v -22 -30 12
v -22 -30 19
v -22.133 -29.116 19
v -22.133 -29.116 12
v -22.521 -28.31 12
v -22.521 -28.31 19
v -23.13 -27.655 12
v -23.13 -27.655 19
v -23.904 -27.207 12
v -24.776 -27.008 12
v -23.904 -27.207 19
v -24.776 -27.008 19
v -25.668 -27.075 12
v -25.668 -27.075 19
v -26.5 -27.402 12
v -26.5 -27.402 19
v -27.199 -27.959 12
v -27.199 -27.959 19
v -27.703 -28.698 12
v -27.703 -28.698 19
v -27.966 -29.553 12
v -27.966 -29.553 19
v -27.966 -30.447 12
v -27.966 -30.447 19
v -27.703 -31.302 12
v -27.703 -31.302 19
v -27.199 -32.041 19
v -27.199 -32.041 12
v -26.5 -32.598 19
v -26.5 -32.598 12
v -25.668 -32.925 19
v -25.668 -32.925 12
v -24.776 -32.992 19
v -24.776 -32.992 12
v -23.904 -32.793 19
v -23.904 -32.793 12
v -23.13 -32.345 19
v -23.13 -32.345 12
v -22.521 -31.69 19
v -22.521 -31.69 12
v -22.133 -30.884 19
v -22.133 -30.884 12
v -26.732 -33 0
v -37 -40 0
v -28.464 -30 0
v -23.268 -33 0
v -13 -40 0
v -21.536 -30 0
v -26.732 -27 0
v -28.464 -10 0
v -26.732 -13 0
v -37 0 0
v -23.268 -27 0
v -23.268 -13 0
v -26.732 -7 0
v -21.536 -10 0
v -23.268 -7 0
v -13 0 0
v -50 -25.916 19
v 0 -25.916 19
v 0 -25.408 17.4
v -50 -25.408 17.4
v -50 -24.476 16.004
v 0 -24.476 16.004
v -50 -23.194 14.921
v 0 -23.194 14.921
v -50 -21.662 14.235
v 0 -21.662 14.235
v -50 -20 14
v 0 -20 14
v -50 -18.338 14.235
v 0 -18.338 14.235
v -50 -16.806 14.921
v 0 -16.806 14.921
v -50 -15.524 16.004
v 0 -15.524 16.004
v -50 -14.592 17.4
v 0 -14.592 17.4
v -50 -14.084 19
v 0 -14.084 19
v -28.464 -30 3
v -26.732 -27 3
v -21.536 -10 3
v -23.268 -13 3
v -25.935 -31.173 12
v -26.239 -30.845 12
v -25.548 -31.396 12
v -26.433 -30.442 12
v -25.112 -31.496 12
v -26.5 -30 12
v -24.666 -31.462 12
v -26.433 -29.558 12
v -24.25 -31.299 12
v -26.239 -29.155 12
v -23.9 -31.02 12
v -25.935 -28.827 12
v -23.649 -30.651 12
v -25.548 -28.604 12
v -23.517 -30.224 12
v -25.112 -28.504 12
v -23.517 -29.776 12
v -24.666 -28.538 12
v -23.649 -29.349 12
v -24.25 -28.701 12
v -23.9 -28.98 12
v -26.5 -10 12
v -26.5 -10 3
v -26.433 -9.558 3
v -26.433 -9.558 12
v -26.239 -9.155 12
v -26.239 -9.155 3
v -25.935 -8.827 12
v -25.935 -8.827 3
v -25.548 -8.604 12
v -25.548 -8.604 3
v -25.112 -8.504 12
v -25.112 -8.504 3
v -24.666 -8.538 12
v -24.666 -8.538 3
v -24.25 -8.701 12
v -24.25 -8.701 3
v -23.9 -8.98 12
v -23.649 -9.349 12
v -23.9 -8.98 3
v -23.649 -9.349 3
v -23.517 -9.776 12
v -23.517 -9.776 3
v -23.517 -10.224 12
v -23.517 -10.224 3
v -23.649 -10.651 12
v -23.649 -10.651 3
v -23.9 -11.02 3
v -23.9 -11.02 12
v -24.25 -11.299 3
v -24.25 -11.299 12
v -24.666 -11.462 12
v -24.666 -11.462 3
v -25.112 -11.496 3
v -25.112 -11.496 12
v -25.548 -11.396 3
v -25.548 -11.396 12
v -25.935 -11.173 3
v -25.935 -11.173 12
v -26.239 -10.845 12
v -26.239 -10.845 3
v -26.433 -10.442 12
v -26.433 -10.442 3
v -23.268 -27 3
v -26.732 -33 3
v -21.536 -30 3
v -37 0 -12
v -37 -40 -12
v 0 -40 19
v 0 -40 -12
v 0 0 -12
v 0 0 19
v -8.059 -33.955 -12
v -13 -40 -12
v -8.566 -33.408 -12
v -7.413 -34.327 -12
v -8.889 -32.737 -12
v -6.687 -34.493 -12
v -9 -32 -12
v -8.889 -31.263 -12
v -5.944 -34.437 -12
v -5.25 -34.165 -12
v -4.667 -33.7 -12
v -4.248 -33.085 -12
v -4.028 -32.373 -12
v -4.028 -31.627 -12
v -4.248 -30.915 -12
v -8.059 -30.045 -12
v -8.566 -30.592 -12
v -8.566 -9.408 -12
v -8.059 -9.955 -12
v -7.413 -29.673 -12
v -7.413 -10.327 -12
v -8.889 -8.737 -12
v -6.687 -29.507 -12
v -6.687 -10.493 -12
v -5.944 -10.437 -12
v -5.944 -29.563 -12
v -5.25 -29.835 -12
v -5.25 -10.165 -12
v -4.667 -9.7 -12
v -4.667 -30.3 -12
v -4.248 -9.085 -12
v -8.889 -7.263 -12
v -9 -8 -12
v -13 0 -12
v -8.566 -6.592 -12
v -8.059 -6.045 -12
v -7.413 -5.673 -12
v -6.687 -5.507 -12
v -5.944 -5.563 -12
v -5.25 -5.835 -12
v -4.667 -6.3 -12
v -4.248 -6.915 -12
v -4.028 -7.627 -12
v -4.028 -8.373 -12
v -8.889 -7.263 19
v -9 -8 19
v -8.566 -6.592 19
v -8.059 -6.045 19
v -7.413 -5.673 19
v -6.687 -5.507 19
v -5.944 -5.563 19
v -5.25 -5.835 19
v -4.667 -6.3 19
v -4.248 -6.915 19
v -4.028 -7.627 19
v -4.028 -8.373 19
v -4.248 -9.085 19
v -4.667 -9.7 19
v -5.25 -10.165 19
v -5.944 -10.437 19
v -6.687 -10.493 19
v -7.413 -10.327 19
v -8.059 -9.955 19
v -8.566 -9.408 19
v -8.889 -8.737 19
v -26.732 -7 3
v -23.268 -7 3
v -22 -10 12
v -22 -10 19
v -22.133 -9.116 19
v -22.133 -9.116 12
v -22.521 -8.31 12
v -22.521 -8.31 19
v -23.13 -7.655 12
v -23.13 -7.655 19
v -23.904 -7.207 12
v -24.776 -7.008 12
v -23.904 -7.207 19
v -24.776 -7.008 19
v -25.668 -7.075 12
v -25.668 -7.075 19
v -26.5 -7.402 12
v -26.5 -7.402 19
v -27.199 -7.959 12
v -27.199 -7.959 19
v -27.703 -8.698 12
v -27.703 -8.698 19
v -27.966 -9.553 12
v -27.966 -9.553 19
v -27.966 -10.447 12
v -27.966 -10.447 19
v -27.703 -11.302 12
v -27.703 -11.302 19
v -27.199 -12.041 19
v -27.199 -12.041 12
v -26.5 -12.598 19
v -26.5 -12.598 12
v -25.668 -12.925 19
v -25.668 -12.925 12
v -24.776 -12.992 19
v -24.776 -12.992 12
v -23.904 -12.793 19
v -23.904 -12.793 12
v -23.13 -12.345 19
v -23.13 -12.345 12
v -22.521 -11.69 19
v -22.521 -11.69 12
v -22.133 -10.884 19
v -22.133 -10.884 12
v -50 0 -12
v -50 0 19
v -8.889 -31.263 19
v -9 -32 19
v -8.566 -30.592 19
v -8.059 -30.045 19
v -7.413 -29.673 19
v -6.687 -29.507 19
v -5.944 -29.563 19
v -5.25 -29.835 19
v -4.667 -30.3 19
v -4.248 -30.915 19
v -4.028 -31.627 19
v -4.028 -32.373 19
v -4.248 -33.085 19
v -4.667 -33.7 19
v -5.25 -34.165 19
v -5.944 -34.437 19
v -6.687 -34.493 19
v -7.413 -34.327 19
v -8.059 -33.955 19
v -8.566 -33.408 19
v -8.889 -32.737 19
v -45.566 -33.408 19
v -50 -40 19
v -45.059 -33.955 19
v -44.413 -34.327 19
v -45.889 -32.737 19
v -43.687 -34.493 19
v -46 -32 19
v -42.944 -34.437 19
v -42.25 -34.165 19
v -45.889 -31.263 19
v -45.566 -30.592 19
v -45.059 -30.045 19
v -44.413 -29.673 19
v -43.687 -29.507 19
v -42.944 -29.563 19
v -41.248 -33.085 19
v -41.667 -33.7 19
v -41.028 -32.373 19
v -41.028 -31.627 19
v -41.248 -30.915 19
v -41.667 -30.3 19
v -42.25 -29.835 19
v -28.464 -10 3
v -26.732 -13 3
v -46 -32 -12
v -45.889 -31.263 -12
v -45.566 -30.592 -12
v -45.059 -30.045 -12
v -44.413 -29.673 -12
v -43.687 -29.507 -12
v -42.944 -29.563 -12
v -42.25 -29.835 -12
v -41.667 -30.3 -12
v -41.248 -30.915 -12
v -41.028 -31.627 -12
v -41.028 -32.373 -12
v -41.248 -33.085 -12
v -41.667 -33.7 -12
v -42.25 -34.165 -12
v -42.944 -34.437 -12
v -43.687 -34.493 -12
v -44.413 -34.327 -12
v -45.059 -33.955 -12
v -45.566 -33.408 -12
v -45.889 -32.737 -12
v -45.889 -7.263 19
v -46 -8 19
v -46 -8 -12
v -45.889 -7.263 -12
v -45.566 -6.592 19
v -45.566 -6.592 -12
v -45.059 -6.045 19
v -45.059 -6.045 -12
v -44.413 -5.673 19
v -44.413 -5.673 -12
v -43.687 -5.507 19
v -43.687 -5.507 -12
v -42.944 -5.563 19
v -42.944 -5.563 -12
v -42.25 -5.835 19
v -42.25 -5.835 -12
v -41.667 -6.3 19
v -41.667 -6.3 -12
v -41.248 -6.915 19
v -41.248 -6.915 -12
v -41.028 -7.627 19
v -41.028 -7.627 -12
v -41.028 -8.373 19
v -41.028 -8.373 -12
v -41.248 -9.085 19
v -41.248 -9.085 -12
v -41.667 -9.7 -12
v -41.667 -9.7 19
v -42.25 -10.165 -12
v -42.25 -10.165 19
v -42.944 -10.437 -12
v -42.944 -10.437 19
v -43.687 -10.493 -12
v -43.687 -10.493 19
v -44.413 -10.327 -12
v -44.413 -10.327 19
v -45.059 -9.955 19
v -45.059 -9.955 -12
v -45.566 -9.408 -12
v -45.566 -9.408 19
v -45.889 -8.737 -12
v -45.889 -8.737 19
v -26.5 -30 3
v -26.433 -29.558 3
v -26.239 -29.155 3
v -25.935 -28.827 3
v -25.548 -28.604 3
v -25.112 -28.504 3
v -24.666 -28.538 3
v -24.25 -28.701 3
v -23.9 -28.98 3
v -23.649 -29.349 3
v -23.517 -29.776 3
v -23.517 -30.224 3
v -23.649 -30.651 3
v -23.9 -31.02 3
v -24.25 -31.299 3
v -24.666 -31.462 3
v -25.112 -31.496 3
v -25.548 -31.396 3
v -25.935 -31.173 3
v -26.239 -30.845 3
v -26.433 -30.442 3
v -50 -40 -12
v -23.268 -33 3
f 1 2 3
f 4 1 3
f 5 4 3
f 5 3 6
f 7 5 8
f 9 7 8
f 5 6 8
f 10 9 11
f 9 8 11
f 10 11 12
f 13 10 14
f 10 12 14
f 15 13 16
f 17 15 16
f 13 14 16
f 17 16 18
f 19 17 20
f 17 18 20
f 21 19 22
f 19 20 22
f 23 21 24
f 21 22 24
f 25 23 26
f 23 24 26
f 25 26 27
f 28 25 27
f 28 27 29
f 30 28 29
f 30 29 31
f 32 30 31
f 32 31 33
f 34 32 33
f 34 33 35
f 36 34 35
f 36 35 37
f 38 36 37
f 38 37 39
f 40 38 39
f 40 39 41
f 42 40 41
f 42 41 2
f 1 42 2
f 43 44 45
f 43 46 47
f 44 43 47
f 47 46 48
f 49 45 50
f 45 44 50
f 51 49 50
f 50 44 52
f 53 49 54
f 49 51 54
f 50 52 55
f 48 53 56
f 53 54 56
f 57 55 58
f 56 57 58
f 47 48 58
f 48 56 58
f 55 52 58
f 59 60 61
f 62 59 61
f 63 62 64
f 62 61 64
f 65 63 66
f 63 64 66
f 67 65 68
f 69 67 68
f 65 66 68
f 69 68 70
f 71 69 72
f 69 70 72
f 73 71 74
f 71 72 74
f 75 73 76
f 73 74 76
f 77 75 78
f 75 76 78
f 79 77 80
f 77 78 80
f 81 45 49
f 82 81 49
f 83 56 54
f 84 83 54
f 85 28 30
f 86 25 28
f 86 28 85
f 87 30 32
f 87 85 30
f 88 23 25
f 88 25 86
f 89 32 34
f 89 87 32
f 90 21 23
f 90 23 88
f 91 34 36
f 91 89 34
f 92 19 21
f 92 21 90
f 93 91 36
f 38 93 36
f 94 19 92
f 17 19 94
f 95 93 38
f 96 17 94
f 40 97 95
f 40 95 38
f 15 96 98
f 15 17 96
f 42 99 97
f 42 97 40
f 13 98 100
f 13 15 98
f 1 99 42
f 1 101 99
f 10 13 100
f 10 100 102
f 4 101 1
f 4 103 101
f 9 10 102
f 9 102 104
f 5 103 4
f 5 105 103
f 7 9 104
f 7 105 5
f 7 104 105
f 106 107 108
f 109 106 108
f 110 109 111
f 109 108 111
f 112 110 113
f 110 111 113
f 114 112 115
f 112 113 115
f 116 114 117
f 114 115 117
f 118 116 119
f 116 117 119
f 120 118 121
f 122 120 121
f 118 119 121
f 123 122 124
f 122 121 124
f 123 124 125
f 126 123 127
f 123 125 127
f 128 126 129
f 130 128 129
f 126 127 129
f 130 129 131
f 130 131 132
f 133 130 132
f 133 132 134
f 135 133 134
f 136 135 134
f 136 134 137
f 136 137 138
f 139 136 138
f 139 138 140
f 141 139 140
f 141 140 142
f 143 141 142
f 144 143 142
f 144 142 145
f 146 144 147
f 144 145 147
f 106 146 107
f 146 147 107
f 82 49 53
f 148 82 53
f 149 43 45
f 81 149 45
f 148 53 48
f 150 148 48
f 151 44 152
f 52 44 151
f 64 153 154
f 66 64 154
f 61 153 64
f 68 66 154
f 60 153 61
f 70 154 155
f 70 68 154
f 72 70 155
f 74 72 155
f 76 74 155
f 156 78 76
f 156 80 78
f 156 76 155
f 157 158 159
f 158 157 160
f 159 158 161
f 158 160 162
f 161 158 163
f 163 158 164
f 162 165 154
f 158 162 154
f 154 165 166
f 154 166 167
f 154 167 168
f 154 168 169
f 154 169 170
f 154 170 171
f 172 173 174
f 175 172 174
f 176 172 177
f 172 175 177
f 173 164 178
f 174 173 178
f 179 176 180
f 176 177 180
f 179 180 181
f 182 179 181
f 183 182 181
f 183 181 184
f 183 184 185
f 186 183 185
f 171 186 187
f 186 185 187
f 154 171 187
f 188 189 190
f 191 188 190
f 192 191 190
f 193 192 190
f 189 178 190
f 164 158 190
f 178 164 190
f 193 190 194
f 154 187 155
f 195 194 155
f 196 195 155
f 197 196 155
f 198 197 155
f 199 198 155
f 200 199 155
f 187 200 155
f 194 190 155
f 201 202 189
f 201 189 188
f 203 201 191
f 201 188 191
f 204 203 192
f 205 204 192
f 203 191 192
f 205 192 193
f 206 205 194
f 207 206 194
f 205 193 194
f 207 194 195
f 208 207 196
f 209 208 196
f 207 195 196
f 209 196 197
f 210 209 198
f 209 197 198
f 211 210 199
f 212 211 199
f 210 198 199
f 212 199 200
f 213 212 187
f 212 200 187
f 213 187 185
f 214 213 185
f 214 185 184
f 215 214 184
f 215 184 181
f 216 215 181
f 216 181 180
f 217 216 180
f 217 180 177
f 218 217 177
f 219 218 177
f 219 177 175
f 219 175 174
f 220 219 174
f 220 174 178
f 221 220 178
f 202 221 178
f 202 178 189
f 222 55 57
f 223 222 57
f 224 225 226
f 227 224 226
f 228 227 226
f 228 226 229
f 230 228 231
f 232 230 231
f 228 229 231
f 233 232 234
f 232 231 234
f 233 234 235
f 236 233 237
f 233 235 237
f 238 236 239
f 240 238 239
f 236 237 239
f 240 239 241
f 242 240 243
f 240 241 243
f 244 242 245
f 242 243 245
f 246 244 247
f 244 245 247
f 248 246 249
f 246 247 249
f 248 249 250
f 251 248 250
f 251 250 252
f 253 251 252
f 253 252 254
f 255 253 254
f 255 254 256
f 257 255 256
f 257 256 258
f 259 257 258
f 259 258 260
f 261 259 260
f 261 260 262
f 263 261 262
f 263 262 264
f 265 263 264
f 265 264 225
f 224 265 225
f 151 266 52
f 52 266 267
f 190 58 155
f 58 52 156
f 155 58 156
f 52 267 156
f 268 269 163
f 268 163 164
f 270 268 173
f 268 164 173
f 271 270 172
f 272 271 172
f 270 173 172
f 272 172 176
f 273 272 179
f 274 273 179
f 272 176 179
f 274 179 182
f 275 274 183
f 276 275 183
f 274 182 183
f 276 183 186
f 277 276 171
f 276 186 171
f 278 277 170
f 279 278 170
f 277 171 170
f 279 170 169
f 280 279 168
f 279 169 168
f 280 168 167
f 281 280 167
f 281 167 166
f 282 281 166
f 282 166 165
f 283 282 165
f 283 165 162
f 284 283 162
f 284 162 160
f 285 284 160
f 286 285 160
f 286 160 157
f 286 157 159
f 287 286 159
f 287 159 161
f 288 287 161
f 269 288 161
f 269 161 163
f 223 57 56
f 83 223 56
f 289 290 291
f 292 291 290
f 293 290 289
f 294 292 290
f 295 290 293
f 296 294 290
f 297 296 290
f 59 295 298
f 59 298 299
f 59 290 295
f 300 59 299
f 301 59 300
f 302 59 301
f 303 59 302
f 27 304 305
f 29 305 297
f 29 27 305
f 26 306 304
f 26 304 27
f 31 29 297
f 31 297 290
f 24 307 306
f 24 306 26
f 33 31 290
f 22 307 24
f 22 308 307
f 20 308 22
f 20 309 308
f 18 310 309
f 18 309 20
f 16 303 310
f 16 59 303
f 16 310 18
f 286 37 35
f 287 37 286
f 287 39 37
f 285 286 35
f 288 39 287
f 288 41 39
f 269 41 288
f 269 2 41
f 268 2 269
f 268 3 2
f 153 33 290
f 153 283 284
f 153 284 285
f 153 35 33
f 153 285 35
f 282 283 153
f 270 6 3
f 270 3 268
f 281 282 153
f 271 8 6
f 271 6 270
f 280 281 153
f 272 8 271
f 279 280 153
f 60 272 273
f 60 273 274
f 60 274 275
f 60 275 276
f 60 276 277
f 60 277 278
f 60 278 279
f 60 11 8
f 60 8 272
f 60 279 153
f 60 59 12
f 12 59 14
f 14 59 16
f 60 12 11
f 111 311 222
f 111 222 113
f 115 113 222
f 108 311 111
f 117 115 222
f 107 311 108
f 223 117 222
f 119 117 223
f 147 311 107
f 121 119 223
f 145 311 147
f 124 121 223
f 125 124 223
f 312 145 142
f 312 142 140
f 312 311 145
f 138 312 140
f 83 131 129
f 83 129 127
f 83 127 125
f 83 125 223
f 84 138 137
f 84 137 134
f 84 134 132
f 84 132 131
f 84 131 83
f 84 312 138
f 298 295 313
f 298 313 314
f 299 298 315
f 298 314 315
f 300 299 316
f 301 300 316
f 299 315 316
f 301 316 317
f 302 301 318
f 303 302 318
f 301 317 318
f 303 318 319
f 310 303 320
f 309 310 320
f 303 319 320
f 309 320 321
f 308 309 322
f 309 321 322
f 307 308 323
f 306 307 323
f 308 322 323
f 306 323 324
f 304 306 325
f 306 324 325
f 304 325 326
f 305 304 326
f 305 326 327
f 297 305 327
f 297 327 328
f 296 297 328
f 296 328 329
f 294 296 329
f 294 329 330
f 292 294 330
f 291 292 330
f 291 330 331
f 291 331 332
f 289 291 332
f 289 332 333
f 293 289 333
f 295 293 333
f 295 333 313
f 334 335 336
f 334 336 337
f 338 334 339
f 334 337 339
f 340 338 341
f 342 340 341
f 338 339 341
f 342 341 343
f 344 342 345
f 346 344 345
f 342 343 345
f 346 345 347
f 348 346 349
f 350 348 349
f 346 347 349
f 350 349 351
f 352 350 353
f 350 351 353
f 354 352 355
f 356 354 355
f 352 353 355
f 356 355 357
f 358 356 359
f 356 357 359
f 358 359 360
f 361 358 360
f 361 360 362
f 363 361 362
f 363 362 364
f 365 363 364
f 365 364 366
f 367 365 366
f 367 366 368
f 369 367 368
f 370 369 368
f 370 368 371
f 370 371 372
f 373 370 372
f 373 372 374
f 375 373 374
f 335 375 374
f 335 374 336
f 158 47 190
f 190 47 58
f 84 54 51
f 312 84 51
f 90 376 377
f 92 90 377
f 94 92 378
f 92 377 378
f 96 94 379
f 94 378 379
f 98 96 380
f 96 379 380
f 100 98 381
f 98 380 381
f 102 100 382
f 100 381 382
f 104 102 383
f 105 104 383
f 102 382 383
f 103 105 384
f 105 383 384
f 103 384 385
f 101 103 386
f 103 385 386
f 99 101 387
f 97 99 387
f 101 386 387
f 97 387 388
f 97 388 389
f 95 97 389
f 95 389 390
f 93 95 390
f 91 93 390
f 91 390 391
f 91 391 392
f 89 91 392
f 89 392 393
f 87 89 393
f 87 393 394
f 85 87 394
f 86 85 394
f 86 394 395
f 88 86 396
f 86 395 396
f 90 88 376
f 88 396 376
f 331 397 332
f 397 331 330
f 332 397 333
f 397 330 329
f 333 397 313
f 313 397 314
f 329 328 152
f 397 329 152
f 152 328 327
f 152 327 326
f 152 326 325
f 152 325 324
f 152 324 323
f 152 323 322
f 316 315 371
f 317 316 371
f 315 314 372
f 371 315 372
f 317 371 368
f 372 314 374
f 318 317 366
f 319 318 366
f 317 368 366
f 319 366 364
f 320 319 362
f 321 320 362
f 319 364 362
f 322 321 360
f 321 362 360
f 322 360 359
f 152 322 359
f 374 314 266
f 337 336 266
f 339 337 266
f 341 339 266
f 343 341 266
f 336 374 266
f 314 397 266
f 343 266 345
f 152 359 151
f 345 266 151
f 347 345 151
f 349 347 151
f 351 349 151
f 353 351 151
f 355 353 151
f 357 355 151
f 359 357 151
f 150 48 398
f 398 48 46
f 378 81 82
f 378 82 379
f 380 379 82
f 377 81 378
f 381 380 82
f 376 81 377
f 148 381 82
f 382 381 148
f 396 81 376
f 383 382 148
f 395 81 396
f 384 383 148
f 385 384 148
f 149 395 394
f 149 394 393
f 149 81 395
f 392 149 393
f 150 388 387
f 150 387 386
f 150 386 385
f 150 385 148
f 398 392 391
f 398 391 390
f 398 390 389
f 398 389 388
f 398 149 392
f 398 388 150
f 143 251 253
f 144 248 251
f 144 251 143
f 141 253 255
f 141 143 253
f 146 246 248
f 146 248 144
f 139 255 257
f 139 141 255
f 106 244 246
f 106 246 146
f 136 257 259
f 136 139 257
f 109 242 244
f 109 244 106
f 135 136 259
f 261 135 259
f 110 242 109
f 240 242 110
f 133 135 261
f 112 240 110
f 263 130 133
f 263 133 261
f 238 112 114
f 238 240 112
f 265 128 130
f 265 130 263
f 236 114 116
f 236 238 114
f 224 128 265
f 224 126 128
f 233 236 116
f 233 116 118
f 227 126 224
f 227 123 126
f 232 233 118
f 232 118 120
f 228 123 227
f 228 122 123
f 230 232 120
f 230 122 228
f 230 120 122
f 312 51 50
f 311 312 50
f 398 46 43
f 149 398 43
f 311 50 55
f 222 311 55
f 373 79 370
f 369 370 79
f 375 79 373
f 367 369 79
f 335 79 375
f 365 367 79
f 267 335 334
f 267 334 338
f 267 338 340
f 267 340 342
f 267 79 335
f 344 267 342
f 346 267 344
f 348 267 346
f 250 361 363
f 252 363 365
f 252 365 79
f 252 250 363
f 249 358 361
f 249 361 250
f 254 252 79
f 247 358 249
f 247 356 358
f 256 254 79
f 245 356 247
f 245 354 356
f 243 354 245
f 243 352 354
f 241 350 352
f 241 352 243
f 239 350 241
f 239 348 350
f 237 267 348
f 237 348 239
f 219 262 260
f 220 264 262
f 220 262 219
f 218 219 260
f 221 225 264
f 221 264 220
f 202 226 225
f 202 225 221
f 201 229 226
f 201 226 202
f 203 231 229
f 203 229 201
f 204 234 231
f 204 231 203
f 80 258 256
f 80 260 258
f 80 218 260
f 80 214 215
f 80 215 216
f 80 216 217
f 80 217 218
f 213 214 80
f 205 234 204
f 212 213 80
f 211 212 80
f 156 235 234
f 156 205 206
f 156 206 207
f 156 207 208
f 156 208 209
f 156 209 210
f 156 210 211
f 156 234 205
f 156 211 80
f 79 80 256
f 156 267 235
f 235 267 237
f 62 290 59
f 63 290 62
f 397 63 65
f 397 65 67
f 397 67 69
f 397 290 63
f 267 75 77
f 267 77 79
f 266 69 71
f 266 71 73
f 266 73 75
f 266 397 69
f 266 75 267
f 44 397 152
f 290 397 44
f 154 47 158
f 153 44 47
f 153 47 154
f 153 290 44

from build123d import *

# Parameters (mm, degrees)
F0_W           = 13
F0_H           = 40
F0_W_2         = 24
F1_DEPTH       = 19
F3_DEPTH       = 50
F4_DEPTH       = 12
F6_D           = 5
F8_D           = 3
F8_CBORE_D     = 6
F8_CBORE_DEPTH = 7
F9_R           = 1.5
F10_DEPTH      = 3


with BuildPart() as f1:
    # F0 (on Top) → F1 (new body)
    with BuildSketch(Plane.XY):
        with Locations((-43.5, -20)):
            Rectangle(F0_W, F0_H)
        with Locations((-25, -20)):
            Rectangle(F0_W_2, F0_H)
        with Locations((-6.5, -20)):
            Rectangle(F0_W, F0_H)
    extrude(amount=F1_DEPTH)

    # F2 (on face) → F3 (cut)
    with BuildSketch(Plane.YZ):
        with BuildLine():
            Line((-14.0839202169, 19), (-25.9160797831, 19))
            ThreePointArc((-25.9160797831, 19), (-20, 14), (-14.0839202169, 19))
        make_face()
    extrude(amount=-F3_DEPTH, mode=Mode.SUBTRACT)

    # F0 (on Top) → F4 (join)
    with BuildSketch(Plane.XY):
        with Locations((-6.5, -20)):
            Rectangle(F0_W, F0_H)
        with Locations((-43.5, -20)):
            Rectangle(F0_W, F0_H)
    extrude(amount=-F4_DEPTH)

    # F6 (through all)
    with Locations(Plane.XY.offset(19)):
        with Locations((-6.5, -32), (-43.5, -32), (-43.5, -8), (-6.5, -8)):
            Hole(F6_D / 2)

    # F8 (through all)
    with Locations(Plane.XY.offset(19)):
        with Locations((-25, -10), (-25, -30)):
            CounterBoreHole(F8_D / 2, F8_CBORE_D / 2, F8_CBORE_DEPTH)

    # F9 (on face) → F10 (cut)
    with BuildSketch(Plane(origin=(0, 0, 0), x_dir=(1, 0, 0), z_dir=(0, 0, -1))):
        Polygon((-23.2679491924, 13), (-26.7320508076, 13), (-28.4641016151, 10), (-26.7320508076, 7), (-23.2679491924, 7), (-21.5358983849, 10), align=None)
        with Locations((-25, 10)):
            Circle(F9_R, mode=Mode.SUBTRACT)
        Polygon((-23.2679491924, 33), (-26.7320508076, 33), (-28.4641016151, 30), (-26.7320508076, 27), (-23.2679491924, 27), (-21.5358983849, 30), align=None)
        with Locations((-25, 30)):
            Circle(F9_R, mode=Mode.SUBTRACT)
    extrude(amount=-F10_DEPTH, mode=Mode.SUBTRACT)


solid = f1.part
